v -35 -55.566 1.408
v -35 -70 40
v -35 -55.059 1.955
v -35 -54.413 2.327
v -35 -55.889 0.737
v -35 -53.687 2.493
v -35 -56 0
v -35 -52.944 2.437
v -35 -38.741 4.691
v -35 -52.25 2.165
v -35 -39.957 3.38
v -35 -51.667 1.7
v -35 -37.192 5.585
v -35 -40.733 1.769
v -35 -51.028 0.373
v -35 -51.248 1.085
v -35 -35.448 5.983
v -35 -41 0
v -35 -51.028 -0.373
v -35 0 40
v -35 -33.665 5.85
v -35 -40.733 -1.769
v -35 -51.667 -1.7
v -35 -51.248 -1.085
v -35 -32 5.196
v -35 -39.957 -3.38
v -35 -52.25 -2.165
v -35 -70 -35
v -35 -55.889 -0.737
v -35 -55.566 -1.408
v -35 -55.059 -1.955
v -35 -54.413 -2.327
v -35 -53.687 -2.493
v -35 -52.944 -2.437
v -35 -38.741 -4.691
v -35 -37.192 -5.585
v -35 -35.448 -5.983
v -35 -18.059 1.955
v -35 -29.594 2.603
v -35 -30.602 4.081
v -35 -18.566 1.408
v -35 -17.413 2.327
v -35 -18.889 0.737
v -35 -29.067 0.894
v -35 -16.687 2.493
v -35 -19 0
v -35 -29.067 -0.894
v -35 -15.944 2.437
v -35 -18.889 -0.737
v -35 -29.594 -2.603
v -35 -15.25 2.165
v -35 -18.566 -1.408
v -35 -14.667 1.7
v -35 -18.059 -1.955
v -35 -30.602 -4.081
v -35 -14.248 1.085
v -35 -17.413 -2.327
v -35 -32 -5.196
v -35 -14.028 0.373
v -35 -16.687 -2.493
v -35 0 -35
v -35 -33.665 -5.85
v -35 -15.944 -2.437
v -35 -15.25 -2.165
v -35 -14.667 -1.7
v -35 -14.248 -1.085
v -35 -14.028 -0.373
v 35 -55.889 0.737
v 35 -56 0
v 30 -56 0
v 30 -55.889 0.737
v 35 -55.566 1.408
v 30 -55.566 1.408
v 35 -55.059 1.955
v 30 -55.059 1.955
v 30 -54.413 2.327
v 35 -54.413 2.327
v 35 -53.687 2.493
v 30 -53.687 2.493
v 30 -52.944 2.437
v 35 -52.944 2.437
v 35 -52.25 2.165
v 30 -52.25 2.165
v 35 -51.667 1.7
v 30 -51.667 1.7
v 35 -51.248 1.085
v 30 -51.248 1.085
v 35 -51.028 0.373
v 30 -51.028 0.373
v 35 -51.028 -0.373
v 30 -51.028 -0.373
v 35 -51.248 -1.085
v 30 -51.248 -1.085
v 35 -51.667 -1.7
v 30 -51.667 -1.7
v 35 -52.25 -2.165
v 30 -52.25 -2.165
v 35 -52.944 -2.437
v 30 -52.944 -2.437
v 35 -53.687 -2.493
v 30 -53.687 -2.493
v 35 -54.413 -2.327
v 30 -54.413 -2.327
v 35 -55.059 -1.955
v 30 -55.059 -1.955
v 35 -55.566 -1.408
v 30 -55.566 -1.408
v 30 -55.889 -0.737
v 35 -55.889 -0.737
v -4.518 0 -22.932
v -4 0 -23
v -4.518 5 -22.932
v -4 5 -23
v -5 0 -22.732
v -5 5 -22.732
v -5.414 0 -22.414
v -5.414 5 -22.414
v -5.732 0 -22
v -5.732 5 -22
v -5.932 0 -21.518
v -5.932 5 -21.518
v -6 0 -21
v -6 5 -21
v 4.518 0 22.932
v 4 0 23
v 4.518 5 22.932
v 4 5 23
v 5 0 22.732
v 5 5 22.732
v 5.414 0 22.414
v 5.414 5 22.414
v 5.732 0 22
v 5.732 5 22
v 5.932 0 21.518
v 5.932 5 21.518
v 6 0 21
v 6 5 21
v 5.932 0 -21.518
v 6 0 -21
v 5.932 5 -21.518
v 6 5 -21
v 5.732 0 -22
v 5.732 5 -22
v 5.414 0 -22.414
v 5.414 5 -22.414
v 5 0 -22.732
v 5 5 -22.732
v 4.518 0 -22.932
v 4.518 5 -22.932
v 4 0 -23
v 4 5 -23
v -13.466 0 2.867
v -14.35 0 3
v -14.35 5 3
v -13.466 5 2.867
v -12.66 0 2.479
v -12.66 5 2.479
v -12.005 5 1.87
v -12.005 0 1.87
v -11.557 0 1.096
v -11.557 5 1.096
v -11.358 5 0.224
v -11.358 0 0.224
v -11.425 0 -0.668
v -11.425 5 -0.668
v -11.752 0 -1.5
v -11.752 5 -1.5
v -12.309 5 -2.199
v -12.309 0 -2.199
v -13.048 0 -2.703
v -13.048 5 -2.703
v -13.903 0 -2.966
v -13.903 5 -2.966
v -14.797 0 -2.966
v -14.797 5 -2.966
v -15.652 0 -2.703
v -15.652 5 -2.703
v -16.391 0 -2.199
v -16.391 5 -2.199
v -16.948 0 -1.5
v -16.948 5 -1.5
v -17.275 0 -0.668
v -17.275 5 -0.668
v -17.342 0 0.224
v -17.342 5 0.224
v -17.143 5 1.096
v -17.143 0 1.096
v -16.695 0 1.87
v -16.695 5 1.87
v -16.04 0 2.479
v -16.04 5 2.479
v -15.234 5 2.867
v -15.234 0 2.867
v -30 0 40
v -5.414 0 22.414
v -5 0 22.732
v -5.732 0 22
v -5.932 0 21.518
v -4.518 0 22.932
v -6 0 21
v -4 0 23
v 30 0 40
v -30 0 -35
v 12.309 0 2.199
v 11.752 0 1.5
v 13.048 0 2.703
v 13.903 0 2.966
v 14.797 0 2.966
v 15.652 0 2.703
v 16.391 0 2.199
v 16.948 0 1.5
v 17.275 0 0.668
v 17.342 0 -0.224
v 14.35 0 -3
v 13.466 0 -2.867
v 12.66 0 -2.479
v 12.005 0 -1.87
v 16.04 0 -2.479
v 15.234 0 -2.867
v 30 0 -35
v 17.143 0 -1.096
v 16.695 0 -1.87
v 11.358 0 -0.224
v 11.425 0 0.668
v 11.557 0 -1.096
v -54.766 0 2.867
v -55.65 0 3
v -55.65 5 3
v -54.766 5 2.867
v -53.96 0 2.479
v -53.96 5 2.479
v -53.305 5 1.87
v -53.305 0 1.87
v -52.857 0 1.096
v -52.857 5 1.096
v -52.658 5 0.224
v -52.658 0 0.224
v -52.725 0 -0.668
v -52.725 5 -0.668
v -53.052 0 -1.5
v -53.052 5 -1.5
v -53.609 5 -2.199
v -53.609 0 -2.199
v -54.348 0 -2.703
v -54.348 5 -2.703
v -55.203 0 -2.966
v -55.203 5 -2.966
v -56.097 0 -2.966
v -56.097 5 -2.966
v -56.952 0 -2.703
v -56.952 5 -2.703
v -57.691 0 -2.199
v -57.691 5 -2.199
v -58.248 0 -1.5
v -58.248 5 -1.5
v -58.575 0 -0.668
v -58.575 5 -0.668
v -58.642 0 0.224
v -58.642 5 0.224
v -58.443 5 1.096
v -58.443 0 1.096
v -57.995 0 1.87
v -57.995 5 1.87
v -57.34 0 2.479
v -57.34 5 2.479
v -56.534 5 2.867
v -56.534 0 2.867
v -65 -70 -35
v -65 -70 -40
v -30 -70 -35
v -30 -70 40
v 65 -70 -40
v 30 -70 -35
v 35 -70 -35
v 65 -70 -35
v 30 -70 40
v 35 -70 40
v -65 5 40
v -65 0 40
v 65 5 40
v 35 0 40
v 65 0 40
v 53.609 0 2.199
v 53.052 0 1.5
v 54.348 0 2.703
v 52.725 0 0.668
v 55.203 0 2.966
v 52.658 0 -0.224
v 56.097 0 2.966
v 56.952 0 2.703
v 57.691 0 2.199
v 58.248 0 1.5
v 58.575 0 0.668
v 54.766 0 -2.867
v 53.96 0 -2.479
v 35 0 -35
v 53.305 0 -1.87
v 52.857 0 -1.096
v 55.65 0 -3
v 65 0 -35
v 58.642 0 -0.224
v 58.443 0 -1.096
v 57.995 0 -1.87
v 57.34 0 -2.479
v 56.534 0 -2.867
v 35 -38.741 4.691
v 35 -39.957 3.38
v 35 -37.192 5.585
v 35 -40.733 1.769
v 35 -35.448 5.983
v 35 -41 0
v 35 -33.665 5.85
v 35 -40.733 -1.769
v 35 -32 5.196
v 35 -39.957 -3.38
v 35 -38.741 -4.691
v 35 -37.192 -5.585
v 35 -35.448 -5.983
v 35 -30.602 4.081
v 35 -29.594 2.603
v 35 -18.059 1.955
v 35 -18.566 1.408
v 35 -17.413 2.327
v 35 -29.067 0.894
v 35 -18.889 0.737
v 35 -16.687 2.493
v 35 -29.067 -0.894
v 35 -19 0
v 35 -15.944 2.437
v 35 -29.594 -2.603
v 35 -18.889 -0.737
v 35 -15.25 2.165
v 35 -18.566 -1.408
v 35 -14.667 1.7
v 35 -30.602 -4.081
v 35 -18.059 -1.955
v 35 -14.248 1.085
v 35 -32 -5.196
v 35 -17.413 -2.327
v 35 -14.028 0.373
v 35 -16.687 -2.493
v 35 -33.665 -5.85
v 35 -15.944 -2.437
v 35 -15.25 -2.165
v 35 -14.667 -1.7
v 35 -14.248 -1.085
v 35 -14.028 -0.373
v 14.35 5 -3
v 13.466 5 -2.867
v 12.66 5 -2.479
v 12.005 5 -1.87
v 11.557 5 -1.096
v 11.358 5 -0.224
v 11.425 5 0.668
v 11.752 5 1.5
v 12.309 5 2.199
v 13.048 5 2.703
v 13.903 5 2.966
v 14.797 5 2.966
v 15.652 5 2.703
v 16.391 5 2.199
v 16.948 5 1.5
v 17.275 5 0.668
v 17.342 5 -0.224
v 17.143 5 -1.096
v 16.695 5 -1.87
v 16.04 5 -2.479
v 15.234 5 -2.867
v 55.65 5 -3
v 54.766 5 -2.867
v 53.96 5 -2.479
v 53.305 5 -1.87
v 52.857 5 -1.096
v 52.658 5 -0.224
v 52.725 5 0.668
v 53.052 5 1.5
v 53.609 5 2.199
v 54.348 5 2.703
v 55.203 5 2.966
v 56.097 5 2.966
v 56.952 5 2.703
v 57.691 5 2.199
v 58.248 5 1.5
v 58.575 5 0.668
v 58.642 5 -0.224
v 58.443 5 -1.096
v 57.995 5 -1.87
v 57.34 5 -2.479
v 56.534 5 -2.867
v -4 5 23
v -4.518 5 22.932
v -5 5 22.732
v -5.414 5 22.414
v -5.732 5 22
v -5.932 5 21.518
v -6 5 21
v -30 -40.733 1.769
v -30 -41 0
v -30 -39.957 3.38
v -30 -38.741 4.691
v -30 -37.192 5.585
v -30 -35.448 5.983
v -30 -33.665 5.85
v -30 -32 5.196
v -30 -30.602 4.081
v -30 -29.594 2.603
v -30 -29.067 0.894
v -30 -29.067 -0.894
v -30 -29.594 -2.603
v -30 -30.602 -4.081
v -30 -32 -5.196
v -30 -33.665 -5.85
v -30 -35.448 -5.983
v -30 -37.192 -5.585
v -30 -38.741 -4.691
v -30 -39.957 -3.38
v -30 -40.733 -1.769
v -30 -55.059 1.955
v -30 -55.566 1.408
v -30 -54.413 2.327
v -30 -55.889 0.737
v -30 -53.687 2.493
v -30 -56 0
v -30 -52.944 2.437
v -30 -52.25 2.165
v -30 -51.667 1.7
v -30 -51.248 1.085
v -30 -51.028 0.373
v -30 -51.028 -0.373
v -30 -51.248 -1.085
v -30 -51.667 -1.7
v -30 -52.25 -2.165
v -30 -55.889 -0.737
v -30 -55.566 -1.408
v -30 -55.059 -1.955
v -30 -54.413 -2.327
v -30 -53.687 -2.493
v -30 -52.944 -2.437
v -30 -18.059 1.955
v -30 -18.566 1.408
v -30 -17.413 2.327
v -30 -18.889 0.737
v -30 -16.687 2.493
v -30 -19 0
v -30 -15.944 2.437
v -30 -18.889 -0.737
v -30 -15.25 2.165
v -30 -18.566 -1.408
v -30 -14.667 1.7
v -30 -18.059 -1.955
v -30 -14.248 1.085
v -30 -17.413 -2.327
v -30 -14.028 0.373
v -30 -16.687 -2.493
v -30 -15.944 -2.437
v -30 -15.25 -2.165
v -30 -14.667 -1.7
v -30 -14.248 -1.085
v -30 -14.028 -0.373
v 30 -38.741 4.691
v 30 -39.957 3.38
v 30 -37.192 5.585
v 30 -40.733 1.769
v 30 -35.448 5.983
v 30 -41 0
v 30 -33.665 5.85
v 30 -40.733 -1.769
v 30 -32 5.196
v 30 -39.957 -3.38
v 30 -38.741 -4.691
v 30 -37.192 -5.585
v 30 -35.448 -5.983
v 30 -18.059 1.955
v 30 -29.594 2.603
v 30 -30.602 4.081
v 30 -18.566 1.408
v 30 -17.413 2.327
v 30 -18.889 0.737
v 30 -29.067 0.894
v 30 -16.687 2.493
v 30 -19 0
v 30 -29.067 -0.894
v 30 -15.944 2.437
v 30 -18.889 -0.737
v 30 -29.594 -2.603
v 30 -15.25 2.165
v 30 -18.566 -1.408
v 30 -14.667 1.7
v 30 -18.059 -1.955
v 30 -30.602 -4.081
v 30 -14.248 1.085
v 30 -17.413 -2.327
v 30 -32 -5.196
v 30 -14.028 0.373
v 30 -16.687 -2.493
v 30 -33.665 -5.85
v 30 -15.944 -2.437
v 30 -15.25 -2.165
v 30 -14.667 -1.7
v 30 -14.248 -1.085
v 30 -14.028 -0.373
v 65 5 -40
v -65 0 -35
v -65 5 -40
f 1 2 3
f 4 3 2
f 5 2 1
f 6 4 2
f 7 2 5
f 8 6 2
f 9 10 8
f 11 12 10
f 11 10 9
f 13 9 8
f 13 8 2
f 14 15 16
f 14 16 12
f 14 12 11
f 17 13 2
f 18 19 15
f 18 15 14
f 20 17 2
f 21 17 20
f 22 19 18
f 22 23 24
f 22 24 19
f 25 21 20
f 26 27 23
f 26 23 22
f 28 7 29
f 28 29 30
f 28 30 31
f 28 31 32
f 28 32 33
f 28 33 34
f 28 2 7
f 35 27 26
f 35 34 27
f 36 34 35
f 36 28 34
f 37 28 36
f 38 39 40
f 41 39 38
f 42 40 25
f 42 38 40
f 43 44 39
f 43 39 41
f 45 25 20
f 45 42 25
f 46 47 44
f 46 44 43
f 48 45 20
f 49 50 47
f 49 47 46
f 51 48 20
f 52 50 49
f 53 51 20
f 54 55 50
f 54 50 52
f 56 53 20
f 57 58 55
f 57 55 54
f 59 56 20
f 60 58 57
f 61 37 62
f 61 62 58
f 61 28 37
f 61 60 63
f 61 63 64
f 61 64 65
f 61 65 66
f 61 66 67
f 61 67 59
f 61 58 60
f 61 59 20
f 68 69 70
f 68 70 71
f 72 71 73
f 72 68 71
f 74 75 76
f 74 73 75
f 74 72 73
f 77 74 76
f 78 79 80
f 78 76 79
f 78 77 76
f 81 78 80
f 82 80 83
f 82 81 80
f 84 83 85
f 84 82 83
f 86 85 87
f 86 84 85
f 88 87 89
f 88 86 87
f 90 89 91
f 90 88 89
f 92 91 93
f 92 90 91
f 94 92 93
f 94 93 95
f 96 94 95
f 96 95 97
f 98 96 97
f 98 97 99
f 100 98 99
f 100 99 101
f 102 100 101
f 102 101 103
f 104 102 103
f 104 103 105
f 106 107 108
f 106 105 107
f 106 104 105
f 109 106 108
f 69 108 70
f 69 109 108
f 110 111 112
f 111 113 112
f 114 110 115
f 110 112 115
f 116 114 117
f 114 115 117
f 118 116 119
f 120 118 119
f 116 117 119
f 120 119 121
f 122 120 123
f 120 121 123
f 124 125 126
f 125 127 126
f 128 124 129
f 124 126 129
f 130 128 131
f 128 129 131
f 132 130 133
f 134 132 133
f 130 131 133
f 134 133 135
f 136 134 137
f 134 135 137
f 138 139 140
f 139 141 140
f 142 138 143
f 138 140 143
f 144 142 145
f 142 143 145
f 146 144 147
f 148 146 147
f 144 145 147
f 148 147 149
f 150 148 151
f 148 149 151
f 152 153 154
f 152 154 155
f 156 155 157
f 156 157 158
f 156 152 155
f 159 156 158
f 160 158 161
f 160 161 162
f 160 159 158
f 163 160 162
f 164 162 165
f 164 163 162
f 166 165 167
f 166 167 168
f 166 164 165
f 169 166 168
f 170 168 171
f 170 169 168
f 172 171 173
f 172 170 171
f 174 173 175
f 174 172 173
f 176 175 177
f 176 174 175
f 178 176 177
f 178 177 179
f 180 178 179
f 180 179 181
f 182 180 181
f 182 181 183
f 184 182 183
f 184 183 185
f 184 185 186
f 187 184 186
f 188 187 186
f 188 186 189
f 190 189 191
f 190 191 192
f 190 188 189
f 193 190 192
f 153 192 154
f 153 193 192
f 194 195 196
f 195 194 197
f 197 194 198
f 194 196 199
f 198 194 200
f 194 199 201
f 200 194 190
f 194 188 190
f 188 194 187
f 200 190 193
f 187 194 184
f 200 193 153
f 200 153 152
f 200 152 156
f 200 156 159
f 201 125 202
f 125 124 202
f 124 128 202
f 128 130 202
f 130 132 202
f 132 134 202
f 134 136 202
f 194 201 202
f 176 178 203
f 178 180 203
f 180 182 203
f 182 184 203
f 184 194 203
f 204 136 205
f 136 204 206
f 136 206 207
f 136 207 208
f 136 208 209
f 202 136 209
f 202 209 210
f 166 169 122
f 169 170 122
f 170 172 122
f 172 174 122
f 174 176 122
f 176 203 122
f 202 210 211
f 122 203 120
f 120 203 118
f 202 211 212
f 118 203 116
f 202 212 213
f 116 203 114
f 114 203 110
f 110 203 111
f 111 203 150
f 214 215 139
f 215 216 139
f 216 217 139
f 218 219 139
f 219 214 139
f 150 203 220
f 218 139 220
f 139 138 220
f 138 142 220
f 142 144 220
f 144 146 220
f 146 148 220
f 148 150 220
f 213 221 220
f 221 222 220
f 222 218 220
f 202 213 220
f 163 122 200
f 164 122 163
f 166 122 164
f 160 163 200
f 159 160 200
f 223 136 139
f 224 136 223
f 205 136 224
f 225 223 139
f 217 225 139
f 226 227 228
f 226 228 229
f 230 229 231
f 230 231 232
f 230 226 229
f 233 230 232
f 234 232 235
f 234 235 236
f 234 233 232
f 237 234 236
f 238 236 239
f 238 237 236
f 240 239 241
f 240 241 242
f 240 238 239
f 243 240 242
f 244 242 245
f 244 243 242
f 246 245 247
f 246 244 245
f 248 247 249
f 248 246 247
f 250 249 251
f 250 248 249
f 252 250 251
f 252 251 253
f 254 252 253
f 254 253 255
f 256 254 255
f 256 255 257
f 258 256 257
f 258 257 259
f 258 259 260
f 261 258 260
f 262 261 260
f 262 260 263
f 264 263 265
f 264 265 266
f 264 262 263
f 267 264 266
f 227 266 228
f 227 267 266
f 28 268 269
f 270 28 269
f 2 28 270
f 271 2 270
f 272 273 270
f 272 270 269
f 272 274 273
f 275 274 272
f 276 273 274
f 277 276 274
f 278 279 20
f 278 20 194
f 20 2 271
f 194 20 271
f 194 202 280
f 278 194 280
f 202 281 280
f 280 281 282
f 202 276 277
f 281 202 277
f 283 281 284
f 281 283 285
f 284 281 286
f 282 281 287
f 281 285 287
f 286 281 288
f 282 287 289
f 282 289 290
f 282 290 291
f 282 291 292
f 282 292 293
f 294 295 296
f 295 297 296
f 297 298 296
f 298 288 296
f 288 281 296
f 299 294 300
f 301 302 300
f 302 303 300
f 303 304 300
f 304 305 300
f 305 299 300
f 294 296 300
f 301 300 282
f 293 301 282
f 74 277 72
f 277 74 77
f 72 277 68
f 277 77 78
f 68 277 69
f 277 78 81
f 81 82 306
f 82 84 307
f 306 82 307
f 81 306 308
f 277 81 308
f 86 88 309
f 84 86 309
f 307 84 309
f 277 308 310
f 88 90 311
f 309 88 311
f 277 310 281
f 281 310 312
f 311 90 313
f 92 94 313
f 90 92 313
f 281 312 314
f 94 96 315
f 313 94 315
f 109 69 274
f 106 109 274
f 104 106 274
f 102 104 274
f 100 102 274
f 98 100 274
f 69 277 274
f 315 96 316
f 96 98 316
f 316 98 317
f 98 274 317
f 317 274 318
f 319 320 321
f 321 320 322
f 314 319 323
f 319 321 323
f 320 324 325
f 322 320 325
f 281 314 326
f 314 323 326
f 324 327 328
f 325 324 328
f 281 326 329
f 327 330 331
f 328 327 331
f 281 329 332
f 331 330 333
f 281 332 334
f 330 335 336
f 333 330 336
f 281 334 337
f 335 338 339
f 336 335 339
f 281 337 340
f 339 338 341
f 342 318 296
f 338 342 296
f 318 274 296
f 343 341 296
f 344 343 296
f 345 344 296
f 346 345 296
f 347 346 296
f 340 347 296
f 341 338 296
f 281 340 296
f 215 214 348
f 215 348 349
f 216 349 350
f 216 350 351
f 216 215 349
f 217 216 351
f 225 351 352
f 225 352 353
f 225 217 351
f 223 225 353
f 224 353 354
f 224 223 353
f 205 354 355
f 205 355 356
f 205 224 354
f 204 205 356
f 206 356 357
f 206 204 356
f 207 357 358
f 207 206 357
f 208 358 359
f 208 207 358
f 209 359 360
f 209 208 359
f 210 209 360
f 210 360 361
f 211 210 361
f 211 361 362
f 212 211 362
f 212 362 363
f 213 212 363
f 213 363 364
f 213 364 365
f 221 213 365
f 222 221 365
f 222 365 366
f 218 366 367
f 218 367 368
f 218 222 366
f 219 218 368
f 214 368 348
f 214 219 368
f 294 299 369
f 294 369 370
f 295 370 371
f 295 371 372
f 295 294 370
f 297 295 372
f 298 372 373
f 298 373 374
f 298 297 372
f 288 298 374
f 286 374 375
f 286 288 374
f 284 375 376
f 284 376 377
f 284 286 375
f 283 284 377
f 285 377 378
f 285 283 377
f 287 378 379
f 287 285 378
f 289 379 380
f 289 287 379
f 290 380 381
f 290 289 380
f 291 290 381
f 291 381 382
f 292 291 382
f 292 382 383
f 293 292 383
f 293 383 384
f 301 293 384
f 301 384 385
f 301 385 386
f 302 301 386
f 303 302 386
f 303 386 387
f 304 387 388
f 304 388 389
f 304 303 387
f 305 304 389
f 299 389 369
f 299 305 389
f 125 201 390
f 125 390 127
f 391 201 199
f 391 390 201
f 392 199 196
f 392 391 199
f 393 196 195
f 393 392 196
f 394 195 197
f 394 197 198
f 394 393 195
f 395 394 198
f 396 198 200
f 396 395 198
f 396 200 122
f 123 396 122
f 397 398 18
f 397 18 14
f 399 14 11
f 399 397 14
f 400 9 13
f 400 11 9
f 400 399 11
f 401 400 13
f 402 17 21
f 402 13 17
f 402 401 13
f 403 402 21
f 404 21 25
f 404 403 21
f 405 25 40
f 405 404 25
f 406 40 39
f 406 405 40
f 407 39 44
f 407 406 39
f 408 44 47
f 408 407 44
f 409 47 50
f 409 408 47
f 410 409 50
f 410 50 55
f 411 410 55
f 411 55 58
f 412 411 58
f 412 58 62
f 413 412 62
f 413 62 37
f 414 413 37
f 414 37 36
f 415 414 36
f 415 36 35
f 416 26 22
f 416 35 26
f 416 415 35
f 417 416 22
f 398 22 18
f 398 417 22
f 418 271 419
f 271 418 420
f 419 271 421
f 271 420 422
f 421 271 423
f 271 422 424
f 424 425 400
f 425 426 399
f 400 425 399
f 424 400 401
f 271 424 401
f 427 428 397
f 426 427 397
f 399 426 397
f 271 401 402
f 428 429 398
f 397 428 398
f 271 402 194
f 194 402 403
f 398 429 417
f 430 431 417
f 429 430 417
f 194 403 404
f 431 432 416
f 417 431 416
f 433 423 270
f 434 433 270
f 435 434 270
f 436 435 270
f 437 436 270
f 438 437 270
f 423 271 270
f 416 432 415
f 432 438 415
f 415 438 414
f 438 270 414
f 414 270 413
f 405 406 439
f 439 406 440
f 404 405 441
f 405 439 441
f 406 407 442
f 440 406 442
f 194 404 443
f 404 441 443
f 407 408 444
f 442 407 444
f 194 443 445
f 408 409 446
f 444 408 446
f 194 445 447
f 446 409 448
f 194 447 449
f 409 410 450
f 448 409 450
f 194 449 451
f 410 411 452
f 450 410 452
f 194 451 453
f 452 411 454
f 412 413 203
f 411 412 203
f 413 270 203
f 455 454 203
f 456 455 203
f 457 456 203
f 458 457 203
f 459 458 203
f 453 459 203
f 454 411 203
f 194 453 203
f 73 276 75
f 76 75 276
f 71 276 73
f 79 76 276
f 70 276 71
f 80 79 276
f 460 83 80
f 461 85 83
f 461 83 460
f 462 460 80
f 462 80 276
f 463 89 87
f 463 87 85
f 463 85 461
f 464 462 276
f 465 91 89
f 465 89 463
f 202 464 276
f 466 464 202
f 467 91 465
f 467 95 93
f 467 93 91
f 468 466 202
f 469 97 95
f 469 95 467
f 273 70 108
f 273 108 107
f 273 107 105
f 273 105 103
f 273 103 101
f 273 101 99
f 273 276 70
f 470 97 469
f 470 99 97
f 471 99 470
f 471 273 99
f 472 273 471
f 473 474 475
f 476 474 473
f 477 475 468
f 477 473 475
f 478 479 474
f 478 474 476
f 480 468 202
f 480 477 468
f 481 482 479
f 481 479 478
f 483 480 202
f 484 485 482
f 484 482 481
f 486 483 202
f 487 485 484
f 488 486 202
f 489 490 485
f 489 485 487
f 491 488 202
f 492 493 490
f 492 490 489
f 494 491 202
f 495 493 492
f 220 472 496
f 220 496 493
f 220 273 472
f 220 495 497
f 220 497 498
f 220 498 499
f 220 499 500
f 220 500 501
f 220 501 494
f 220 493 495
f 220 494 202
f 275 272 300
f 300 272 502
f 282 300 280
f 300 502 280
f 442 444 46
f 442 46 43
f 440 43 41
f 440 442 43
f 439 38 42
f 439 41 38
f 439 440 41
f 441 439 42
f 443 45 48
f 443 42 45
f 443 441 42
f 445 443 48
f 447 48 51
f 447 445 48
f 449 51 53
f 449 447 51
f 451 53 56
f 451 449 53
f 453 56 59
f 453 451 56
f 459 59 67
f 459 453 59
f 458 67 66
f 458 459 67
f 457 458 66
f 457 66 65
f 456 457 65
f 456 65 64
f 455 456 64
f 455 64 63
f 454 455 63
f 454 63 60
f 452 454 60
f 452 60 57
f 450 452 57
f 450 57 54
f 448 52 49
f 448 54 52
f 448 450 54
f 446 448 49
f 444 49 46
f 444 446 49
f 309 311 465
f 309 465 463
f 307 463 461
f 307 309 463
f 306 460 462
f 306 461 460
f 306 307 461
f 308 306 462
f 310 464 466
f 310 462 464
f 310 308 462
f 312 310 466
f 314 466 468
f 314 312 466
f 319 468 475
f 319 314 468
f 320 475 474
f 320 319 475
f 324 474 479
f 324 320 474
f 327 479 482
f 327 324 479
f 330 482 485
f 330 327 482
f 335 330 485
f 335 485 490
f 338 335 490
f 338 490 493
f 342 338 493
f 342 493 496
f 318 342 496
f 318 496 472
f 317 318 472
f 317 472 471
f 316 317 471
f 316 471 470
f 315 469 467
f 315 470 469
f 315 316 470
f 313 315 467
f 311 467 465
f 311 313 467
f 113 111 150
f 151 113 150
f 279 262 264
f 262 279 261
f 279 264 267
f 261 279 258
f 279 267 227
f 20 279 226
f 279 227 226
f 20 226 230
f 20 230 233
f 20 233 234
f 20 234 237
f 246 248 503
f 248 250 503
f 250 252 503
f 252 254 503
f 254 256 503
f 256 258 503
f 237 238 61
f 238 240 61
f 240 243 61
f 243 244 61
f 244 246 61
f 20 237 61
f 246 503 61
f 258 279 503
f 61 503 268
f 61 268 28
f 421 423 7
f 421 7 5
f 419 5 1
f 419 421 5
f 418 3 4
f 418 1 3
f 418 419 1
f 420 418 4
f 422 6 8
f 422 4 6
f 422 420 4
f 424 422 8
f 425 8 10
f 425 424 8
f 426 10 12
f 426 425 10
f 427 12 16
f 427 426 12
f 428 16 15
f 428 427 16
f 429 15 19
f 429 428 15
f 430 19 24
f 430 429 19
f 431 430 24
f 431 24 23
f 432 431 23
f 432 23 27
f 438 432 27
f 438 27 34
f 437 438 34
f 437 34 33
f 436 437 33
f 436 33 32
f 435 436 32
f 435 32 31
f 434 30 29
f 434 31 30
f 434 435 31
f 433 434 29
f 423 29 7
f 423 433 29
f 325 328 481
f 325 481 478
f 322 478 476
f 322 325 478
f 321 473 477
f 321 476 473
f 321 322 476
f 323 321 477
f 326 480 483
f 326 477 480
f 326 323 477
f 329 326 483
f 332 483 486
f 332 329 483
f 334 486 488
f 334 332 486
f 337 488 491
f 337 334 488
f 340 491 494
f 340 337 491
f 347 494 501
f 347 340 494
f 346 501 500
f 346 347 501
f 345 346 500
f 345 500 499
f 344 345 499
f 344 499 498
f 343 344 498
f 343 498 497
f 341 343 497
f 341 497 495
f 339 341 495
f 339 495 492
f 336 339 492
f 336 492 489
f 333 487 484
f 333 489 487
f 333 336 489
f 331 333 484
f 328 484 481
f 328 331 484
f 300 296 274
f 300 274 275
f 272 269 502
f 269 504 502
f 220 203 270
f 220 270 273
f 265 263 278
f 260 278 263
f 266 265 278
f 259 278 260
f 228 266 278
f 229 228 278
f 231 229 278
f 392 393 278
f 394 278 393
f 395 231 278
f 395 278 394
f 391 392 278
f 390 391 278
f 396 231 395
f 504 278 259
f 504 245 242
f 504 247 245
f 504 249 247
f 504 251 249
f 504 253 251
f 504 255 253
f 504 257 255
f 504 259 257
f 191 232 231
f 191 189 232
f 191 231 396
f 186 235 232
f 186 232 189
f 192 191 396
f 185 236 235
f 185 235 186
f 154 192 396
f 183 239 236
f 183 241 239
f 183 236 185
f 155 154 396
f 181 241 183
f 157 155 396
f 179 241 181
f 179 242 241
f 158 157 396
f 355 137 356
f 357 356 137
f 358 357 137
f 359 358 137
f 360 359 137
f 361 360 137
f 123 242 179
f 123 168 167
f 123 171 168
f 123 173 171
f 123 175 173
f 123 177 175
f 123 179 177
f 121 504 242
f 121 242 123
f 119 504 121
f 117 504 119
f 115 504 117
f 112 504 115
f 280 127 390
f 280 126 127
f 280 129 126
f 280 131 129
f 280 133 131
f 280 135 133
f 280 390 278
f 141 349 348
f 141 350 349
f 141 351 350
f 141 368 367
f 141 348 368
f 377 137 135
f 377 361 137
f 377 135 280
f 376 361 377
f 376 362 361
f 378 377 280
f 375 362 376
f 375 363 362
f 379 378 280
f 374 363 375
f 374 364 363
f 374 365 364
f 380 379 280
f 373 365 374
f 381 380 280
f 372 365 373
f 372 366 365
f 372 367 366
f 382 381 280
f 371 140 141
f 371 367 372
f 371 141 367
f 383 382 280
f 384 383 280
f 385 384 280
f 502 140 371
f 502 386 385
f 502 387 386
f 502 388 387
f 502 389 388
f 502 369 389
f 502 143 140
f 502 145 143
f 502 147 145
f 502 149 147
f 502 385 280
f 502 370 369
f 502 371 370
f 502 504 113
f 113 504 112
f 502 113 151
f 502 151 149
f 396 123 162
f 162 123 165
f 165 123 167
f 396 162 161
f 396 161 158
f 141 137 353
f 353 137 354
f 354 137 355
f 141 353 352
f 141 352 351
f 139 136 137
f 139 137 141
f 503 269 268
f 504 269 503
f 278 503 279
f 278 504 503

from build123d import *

# Parameters (mm, degrees)
SKETCH1_W               = 130
SKETCH1_H               = 80
SKETCH1_R               = 3
SKETCH1_W_2             = 12
SKETCH1_H_2             = 46
BOSS_EXTRUDE1_DEPTH     = 5
FILLET1_R               = 2
SKETCH2_W               = 130
SKETCH2_H               = 5
BOSS_EXTRUDE2_DEPTH     = 70
SKETCH3_W               = 5
SKETCH3_H               = 70
BOSS_EXTRUDE3_DEPTH     = 75
CUT_EXTRUDE1_DEPTH      = 129.452325787
CUT_EXTRUDE1_DEPTH_BACK = 129.452325787
SKETCH4_R               = 6
SKETCH4_R_2             = 2.5


with BuildPart() as part:
    # Sketch1 → Boss-Extrude1 (new body)
    with BuildSketch(Plane(origin=(0, 0, 0), x_dir=(1, 0, 0), z_dir=(0, 1, 0))):
        Rectangle(SKETCH1_W, SKETCH1_H)
        with Locations(Location((-14.35, 0, 0), (0, 0, 270))):
            Circle(SKETCH1_R, mode=Mode.SUBTRACT)
        with Locations(Location((-55.65, 0, 0), (0, 0, 270))):
            Circle(SKETCH1_R, mode=Mode.SUBTRACT)
        with Locations(Location((55.65, 0, 0), (0, 0, 90))):
            Circle(SKETCH1_R, mode=Mode.SUBTRACT)
        with Locations(Location((14.35, 0, 0), (0, 0, 90))):
            Circle(SKETCH1_R, mode=Mode.SUBTRACT)
        Rectangle(SKETCH1_W_2, SKETCH1_H_2, mode=Mode.SUBTRACT)
    extrude(amount=BOSS_EXTRUDE1_DEPTH)

    # Fillet1
    fillet1_edges = [part.edges().sort_by_distance(p)[0] for p in [
        (-6, 2.5, -23),
        (-6, 2.5, 23),
        (6, 2.5, 23),
        (6, 2.5, -23),
    ]]
    fillet(fillet1_edges, radius=FILLET1_R)

    # Sketch2 → Boss-Extrude2 (add)
    with BuildSketch(Plane.XZ):
        with Locations((0, -37.5)):
            Rectangle(SKETCH2_W, SKETCH2_H)
    extrude(amount=BOSS_EXTRUDE2_DEPTH)

    # Sketch3 → Boss-Extrude3 (add)
    with BuildSketch(Plane.XY.offset(-35)):
        with Locations((-32.5, -35)):
            Rectangle(SKETCH3_W, SKETCH3_H)
        with Locations((32.5, -35)):
            Rectangle(SKETCH3_W, SKETCH3_H)
    extrude(amount=BOSS_EXTRUDE3_DEPTH)

    # Sketch4 → Cut-Extrude1 (cut, two sides: drawn at the far end of the back side and taken through both)
    with BuildSketch(Plane.ZY.offset(35).offset(-CUT_EXTRUDE1_DEPTH_BACK)):
        with Locations(Location((0, -35, 0), (0, 0, 270))):
            Circle(SKETCH4_R)
        with Locations(Location((0, -16.5, 0), (0, 0, 270))):
            Circle(SKETCH4_R_2)
        with Locations(Location((0, -53.5, 0), (0, 0, 270))):
            Circle(SKETCH4_R_2)
    extrude(amount=CUT_EXTRUDE1_DEPTH + CUT_EXTRUDE1_DEPTH_BACK, mode=Mode.SUBTRACT)


solid = part.part
